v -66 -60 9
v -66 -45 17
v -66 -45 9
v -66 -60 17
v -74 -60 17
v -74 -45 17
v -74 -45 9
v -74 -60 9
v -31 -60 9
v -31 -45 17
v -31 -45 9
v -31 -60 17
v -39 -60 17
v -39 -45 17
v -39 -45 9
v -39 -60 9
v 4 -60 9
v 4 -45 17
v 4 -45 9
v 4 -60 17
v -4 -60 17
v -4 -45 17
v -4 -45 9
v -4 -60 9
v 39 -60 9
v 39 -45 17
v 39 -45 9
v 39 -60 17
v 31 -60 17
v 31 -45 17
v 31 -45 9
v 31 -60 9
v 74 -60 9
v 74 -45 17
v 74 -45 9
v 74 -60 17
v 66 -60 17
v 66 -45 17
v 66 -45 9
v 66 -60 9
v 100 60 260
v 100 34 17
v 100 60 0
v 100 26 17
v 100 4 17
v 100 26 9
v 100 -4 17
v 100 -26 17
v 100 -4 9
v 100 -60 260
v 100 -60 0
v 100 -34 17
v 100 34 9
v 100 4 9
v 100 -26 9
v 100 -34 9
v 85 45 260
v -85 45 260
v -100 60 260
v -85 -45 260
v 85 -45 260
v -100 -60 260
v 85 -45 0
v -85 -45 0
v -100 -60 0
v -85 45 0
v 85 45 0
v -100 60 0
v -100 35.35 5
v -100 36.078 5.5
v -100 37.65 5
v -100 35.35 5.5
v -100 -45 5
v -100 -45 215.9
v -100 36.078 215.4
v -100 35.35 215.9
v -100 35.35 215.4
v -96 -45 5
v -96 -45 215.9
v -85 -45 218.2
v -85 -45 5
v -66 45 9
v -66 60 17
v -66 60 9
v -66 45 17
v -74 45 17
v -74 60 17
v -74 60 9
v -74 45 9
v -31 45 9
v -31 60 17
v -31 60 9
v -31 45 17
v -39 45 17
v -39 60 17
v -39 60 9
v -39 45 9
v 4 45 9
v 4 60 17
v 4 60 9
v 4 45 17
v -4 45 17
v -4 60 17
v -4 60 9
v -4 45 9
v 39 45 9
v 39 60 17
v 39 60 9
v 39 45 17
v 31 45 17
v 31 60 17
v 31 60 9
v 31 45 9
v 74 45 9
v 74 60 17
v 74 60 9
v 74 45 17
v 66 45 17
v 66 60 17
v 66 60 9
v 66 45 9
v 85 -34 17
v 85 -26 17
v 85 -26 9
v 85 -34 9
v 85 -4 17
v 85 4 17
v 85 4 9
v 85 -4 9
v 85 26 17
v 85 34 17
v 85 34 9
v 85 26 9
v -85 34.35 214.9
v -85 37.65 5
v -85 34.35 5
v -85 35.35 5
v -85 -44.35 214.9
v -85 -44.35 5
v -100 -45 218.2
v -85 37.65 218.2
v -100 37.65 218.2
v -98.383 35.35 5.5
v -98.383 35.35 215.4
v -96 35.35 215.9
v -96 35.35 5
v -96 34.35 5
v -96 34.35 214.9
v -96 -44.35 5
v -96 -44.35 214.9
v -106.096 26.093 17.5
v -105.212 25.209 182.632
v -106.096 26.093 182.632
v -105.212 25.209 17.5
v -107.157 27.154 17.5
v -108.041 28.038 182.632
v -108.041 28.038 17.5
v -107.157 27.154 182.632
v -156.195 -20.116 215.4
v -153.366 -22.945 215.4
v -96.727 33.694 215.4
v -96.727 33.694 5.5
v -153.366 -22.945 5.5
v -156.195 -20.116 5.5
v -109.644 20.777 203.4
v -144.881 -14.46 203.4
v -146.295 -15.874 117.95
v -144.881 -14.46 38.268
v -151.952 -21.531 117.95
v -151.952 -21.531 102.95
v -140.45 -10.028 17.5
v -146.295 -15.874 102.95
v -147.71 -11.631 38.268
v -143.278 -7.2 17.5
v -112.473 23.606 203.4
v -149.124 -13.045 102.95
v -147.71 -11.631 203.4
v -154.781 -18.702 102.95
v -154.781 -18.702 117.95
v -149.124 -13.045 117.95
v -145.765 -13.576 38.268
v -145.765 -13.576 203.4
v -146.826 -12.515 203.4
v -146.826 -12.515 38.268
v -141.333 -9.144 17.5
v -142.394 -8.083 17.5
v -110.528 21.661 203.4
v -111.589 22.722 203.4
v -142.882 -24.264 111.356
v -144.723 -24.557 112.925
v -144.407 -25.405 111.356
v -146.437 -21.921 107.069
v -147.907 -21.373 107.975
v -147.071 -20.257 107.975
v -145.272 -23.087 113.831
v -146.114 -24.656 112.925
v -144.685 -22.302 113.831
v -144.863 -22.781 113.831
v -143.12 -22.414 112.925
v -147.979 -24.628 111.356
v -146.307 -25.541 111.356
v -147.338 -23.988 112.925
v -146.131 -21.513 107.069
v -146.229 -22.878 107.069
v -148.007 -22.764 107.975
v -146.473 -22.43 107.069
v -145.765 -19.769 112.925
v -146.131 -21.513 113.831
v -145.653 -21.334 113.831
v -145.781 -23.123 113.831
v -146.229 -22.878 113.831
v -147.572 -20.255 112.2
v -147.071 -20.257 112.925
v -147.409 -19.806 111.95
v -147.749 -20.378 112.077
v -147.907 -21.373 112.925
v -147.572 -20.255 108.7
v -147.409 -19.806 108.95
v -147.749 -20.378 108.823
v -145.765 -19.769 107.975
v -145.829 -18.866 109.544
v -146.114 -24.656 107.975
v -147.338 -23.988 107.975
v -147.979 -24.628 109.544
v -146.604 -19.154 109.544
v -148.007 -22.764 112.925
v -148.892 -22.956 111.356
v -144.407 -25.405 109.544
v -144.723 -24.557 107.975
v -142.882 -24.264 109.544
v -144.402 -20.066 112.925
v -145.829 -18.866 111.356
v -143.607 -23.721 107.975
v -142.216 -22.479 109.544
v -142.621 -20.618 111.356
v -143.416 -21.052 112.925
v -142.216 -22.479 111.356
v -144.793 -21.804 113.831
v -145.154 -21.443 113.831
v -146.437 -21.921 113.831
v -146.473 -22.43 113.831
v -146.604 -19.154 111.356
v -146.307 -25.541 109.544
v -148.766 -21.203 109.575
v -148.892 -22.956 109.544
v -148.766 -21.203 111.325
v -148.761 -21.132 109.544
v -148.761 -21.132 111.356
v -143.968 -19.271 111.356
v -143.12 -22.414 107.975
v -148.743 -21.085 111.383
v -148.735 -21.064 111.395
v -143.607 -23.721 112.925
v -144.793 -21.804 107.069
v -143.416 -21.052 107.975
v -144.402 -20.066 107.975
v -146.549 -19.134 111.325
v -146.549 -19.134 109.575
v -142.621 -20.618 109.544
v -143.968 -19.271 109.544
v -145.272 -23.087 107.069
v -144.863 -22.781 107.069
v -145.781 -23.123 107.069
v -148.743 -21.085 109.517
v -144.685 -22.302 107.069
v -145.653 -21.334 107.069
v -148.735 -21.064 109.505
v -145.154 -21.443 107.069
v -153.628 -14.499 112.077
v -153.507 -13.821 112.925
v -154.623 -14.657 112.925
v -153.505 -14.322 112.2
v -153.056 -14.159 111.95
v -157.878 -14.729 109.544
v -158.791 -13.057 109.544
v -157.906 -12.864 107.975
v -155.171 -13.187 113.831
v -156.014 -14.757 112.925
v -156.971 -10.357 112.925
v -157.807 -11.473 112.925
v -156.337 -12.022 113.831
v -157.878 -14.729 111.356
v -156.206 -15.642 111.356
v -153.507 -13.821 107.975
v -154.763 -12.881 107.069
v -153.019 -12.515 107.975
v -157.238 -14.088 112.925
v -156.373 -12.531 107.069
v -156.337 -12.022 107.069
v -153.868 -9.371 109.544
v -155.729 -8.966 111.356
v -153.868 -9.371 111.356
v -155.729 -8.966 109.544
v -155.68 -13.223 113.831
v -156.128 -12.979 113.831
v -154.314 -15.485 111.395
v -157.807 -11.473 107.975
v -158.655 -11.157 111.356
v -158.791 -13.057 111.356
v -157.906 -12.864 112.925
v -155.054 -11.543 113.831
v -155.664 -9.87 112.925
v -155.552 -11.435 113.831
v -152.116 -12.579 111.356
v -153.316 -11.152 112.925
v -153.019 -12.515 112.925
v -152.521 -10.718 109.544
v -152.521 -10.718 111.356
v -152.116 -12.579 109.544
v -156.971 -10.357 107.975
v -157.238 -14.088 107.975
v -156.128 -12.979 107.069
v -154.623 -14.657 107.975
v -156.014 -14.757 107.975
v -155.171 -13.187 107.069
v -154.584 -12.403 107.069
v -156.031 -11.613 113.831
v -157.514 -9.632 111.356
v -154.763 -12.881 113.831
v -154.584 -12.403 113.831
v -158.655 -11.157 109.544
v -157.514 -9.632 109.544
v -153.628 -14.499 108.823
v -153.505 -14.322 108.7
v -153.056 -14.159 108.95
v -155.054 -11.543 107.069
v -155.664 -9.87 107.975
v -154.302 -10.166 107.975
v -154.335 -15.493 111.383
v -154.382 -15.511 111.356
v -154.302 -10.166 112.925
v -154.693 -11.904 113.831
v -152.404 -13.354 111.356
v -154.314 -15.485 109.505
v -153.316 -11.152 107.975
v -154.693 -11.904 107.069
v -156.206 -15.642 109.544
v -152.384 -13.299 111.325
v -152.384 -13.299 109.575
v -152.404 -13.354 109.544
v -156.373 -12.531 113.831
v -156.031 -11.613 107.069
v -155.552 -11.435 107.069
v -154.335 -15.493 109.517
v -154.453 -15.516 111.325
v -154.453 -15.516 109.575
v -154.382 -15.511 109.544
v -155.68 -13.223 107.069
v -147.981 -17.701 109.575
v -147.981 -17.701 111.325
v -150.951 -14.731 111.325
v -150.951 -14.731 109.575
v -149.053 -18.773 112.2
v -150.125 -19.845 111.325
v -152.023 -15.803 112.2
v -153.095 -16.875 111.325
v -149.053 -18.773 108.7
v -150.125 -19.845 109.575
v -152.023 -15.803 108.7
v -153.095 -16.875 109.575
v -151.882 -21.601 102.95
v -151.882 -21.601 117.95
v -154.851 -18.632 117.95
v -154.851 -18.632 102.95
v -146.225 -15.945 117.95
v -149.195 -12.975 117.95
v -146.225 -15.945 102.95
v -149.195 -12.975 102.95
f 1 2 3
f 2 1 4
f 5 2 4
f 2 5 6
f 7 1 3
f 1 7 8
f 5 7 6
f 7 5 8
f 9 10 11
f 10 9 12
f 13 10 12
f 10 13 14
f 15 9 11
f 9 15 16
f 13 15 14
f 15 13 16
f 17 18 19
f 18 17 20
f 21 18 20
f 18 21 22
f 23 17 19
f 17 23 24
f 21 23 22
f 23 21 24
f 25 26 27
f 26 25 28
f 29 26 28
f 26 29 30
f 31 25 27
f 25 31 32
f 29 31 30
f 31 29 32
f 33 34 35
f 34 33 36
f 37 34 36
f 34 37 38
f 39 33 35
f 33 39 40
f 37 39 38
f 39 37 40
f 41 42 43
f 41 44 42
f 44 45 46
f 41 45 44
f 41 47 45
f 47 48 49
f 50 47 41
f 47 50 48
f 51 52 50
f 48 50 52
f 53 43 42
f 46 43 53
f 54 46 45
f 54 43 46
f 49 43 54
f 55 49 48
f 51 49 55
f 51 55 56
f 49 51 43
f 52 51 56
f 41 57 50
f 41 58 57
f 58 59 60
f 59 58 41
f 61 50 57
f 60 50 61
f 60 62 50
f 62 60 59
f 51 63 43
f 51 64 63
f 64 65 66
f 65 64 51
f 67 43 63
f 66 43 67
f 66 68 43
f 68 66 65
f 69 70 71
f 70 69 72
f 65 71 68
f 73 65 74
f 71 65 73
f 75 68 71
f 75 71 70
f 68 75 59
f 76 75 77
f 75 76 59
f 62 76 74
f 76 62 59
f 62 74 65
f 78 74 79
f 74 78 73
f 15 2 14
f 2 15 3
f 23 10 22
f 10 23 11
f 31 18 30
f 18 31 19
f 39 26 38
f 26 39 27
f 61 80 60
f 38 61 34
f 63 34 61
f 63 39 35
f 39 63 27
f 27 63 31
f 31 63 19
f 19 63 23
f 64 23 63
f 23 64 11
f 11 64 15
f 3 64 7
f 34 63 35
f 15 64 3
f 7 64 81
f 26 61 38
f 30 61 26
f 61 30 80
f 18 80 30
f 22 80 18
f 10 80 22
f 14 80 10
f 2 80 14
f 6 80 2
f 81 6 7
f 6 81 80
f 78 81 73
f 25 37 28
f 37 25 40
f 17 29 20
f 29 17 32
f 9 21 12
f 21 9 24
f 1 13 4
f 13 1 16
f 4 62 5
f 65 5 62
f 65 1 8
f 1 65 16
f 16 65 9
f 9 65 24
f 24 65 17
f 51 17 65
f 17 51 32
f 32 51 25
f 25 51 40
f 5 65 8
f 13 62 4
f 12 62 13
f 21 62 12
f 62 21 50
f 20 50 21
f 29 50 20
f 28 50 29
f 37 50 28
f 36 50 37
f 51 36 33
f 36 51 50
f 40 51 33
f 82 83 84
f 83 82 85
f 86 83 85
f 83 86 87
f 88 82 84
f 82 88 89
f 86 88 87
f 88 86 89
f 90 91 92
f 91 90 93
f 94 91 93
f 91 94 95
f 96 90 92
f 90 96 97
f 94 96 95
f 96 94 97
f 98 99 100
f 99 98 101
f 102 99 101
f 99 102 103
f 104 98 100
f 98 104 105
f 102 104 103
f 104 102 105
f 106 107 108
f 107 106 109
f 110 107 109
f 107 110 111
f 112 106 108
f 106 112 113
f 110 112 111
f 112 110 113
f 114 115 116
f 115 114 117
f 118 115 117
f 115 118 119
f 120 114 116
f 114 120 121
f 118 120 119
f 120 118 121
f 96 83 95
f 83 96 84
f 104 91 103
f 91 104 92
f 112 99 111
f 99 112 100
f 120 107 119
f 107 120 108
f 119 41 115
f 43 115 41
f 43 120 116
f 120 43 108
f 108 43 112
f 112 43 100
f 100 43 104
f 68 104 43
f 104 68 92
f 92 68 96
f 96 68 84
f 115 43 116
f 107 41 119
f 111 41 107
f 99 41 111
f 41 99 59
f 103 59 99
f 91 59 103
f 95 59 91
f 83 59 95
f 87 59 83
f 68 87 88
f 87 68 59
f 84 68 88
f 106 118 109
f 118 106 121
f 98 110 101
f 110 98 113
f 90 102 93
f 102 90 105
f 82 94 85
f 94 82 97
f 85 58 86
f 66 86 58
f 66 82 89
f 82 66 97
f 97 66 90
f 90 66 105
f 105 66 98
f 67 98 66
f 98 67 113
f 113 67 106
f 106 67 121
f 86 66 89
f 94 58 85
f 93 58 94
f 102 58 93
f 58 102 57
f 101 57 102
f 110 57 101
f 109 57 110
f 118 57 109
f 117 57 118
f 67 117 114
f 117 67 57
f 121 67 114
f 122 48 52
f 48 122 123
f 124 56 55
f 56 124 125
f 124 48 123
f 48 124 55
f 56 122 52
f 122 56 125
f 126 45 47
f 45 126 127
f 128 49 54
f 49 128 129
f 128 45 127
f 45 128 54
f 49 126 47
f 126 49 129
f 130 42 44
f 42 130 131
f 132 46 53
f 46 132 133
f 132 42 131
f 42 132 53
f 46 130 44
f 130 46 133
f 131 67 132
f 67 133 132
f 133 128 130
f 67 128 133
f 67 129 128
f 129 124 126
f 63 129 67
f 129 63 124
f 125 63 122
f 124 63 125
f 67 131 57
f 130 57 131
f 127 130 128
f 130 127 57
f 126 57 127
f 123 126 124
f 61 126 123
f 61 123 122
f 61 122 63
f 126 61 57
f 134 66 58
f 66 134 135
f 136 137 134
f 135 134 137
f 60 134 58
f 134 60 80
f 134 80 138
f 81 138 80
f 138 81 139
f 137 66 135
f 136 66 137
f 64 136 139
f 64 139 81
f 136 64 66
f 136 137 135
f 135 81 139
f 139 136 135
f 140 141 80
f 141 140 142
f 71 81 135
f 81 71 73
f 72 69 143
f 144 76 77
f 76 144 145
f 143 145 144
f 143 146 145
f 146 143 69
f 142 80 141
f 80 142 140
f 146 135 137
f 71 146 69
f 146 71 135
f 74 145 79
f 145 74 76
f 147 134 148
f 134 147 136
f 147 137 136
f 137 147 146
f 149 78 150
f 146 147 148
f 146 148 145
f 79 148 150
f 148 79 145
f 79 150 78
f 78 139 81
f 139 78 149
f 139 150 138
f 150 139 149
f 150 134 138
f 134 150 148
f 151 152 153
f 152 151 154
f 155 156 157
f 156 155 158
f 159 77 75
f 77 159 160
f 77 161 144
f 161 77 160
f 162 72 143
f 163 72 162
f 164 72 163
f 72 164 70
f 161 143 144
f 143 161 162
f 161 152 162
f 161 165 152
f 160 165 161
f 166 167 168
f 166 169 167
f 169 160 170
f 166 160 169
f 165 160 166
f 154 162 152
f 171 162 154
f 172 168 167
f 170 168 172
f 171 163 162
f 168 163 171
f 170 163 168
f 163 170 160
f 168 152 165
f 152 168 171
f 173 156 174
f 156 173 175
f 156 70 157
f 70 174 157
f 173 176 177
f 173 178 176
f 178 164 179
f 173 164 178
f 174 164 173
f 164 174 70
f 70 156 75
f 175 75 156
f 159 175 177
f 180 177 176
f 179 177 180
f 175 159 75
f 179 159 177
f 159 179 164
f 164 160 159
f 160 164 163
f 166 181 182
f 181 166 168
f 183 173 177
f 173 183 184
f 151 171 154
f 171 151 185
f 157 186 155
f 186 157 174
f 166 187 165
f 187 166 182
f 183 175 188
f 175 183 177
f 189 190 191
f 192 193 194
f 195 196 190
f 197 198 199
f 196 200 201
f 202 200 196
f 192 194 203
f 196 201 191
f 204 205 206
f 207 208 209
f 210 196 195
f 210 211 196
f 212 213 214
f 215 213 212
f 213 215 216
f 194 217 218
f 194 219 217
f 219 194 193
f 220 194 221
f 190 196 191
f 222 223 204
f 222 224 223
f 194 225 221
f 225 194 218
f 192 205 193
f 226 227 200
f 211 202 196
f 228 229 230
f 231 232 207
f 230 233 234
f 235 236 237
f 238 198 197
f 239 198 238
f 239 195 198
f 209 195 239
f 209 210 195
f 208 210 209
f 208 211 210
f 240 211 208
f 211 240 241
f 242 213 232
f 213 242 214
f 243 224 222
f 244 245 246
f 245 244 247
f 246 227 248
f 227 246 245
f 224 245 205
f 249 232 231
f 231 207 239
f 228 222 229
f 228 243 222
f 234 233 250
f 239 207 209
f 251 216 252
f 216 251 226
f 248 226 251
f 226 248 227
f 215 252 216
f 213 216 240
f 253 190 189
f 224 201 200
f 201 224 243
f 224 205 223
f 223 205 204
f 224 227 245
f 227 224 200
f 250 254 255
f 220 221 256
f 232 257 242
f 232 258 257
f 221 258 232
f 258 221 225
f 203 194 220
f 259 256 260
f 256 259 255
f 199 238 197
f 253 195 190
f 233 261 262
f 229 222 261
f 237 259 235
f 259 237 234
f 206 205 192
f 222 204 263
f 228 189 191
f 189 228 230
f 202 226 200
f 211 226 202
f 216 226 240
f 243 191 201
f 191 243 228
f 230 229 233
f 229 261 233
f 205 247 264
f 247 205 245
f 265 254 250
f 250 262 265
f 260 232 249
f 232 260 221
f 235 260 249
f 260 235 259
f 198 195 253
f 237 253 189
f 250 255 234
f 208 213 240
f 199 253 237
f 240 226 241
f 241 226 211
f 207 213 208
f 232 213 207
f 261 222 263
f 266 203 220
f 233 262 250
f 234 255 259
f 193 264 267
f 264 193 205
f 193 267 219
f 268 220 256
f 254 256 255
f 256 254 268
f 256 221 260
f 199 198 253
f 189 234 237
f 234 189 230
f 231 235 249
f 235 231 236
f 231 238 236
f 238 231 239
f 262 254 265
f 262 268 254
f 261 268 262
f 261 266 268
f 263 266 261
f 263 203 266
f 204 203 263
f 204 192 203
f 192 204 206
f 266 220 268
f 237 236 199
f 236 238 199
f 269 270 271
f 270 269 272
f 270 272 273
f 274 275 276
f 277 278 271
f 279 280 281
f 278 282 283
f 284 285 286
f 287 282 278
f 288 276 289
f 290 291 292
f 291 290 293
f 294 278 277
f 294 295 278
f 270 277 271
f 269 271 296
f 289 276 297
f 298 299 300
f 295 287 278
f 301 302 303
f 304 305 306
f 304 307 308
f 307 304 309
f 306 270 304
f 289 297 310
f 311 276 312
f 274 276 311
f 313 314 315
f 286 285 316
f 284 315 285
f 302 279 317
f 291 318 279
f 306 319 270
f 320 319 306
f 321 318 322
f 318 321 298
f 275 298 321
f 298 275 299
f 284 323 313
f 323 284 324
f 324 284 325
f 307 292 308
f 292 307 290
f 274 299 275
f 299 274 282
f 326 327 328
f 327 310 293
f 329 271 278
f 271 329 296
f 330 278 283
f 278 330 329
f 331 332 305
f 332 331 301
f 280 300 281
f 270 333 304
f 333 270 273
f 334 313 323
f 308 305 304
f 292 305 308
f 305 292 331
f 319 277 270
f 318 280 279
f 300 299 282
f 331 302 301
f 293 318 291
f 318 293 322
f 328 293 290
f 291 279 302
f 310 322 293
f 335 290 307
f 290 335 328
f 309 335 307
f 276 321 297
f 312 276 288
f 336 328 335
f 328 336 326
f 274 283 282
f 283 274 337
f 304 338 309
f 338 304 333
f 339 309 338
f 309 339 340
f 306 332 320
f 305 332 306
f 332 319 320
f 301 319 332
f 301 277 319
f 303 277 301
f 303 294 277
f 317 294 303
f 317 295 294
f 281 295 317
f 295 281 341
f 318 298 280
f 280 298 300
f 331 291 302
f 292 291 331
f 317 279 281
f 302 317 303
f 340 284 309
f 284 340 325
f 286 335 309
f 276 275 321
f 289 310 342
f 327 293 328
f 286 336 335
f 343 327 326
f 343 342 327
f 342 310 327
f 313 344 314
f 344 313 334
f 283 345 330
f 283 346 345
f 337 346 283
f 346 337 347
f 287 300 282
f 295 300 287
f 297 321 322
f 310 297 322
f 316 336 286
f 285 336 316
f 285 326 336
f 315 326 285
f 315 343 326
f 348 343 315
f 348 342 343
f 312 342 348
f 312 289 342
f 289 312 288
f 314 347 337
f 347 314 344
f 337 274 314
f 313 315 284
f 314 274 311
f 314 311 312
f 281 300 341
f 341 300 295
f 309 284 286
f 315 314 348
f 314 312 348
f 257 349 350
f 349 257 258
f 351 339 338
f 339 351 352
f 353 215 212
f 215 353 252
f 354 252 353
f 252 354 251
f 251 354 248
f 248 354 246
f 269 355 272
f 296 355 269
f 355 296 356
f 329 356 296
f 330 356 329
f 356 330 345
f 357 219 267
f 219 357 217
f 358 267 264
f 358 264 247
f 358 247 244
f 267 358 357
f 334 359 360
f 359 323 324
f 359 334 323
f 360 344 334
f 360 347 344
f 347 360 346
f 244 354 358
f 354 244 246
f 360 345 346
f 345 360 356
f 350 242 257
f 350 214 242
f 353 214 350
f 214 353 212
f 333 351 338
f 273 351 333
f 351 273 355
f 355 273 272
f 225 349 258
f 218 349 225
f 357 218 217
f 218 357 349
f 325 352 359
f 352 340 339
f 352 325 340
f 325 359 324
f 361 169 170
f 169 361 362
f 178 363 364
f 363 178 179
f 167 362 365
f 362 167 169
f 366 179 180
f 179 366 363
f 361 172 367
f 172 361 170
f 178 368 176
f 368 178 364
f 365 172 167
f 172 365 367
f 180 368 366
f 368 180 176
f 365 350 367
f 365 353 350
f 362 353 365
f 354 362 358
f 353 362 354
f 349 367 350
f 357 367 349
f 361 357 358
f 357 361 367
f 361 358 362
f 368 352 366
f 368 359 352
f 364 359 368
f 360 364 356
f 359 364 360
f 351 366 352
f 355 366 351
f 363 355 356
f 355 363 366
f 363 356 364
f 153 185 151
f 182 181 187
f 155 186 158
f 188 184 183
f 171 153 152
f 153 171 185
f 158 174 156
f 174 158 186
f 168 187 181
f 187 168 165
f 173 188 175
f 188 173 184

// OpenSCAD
// file: ../doors/basicdoor.scad
module basicdoor(width=95.3, height=213.2, wall_thickness=15, right_handed = true, open_angle = 0) 
{
    profile_width = 12;
    door_thickness = 4.0;
    frame_profile_width = 2.3;
    frame_profile_depth = wall_thickness;
    seal_profile_width = 1.0;
    
    /* Outer frame fixed to convrete wall. */
    color([0.3,0.0,0.1])
    basicdoorframe(false, width, height, frame_profile_width, frame_profile_depth);

    color([0.4,0.2,0.2])
    translate([0, door_thickness/2,-frame_profile_width/2])
    basicdoorframe(false, width - 2 * frame_profile_width,
        height - frame_profile_width, 
        seal_profile_width, frame_profile_depth - door_thickness);
    
    /* Calculate door size. */
    open_w = width - 2 * frame_profile_width - 0.6;
    open_h = height - frame_profile_width - 1.0;

    ow = open_w/2 + 0.2;
    translate([right_handed?-ow:ow, 
        -(frame_profile_depth-door_thickness)/2, -frame_profile_width/2])
    rotate([0, 0, right_handed?-open_angle:open_angle])
    translate([right_handed?ow:-ow, 0, 0])
     union() {
        /* Playwood */
        color([0.4,0.0,0.1])
        cube([open_w, 1.5, open_h], center=true);
        
        /* Door strengtehing. */
        color([0.5,0.2,0.2])
        basicdoorframe(true, open_w, open_h, profile_width, door_thickness);
        
         /* Diagonal strengthening */
        dx = open_w - 2*profile_width;
        dy = open_h - 2*profile_width;
        l = sqrt(dx*dx+dy*dy);
        rotate([0,-atan2(dx,dy), 0])
        color([0.5,0.2,0.2])
        cube([profile_width, door_thickness, l], center=true);
         
         /* Door knob */
         translate([open_w/2 - 6.0, 0, 0])
         color([218/255,172/255,96/255])
         doorknob(door_thickness);
    }
}

module basicdoorframe(draw_bottom=true,width=70, height=110, profile_width = 5, door_thickness = 8) 
{
    translate([-(width - profile_width)/2, 0, 0]) 
    cube([profile_width,door_thickness, height], center=true);
    
    translate([(width - profile_width)/2, 0, 0]) 
    cube([profile_width,door_thickness, height], center=true);

    if (draw_bottom) {
        translate([0, 0, -(height - profile_width)/2]) 
        cube([width, door_thickness, profile_width], center=true);
    }
    
    translate([0, 0, (height - profile_width)/2]) 
    cube([width, door_thickness, profile_width], center=true);
}    

module doorknob(door_thickness = 8)
{
    doorknob_length = 7;
    doorknob_r = 3.5;
    
    translate([0, doorknob_length, 0]) 
    sphere(r=doorknob_r);
    translate([0, -doorknob_length, 0]) 
    sphere(r=doorknob_r);
 
    rotate([90, 90, 0])
    cylinder(h = doorknob_length*2, r = 0.5 * doorknob_r, center=true);
   
    cube([8, door_thickness+0.2, 15],center=true); 
}

// For testing
basicdoor();
// main file
use <../doors/basicdoor.scad>

module pumproom(width=120, length=200, wall_thickness=15, wall_height=260,wall_color=[255/255, 255/255, 255/255],wall_alpha=1.0) 
{
    /* Door opening size. We need some extra space for the door frame. */
    door_width = 80+5.3;
    door_height = 210+3.2;
    
    // Position the door so that bottom of opening is 5 cm above floor level
    door_y_pos = (wall_height-door_height)/2 - 5;
    
    // Position the door horizontally off the center.
    door_x_pos = -5;
   
    // Hole size, 8 cm
    hole_size = 8;

difference() {
    
    translate([0,-width/2+wall_thickness/2, wall_height/2]) 
    color(wall_color, wall_alpha)
    cube([length, wall_thickness, wall_height],center=true);

   n_holes = 5;
    for (x = [0: n_holes-1]) {
        translate([(x-(n_holes-1)/2) * ((length-4*wall_thickness)/(n_holes-1)),
            -width/2+wall_thickness/2, wall_height/20]) 
        color(wall_color, wall_alpha)
        cube([hole_size, 1+wall_thickness, hole_size],center=true);
    }
}

    difference() {
        translate([0,width/2-wall_thickness/2, 
            wall_height/2]) 
        color(wall_color, wall_alpha)
        cube([length, wall_thickness, wall_height],center=true);
     
       n_holes = 5;
        for (x = [0: n_holes-1]) {
            translate([(x-(n_holes-1)/2) * ((length-4*wall_thickness)/(n_holes-1)),
                width/2-wall_thickness/2, wall_height/20]) 
            color(wall_color, wall_alpha)
            cube([hole_size, 1+wall_thickness, hole_size],center=true);
        }
    }
    
    difference() {
        translate([length/2-wall_thickness/2, 0, wall_height/2]) 
        color(wall_color, wall_alpha)
        cube([wall_thickness, width, wall_height],center=true);
        
        n_holes2 = 3;
        for (x = [0: n_holes2-1]) {
            translate([length/2-wall_thickness/2, 
                (x-(n_holes2-1)/2) * ((width-4*wall_thickness)/(n_holes2-1)),
                wall_height/20]) 
            color(wall_color, wall_alpha)
            cube([1+wall_thickness, hole_size, hole_size],center=true);
        }
    }     

    difference() {
        translate([-length/2+wall_thickness/2, 0, wall_height/2])
        color(wall_color, wall_alpha)
        cube([wall_thickness, width, wall_height],center=true);

        translate([-length/2+wall_thickness/2,
            door_x_pos, 
            wall_height/2 - door_y_pos]) 
        color(wall_color, wall_alpha)
        cube([wall_thickness+1, door_width, door_height], center=true);
    }
    
    /* Door */
    translate([-length/2+wall_thickness/2,
        door_x_pos, 
        wall_height/2 - door_y_pos]) 
    rotate([0,0,-90])
    basicdoor(door_width, door_height, wall_thickness, true, 45);
}

// For testing
pumproom();
